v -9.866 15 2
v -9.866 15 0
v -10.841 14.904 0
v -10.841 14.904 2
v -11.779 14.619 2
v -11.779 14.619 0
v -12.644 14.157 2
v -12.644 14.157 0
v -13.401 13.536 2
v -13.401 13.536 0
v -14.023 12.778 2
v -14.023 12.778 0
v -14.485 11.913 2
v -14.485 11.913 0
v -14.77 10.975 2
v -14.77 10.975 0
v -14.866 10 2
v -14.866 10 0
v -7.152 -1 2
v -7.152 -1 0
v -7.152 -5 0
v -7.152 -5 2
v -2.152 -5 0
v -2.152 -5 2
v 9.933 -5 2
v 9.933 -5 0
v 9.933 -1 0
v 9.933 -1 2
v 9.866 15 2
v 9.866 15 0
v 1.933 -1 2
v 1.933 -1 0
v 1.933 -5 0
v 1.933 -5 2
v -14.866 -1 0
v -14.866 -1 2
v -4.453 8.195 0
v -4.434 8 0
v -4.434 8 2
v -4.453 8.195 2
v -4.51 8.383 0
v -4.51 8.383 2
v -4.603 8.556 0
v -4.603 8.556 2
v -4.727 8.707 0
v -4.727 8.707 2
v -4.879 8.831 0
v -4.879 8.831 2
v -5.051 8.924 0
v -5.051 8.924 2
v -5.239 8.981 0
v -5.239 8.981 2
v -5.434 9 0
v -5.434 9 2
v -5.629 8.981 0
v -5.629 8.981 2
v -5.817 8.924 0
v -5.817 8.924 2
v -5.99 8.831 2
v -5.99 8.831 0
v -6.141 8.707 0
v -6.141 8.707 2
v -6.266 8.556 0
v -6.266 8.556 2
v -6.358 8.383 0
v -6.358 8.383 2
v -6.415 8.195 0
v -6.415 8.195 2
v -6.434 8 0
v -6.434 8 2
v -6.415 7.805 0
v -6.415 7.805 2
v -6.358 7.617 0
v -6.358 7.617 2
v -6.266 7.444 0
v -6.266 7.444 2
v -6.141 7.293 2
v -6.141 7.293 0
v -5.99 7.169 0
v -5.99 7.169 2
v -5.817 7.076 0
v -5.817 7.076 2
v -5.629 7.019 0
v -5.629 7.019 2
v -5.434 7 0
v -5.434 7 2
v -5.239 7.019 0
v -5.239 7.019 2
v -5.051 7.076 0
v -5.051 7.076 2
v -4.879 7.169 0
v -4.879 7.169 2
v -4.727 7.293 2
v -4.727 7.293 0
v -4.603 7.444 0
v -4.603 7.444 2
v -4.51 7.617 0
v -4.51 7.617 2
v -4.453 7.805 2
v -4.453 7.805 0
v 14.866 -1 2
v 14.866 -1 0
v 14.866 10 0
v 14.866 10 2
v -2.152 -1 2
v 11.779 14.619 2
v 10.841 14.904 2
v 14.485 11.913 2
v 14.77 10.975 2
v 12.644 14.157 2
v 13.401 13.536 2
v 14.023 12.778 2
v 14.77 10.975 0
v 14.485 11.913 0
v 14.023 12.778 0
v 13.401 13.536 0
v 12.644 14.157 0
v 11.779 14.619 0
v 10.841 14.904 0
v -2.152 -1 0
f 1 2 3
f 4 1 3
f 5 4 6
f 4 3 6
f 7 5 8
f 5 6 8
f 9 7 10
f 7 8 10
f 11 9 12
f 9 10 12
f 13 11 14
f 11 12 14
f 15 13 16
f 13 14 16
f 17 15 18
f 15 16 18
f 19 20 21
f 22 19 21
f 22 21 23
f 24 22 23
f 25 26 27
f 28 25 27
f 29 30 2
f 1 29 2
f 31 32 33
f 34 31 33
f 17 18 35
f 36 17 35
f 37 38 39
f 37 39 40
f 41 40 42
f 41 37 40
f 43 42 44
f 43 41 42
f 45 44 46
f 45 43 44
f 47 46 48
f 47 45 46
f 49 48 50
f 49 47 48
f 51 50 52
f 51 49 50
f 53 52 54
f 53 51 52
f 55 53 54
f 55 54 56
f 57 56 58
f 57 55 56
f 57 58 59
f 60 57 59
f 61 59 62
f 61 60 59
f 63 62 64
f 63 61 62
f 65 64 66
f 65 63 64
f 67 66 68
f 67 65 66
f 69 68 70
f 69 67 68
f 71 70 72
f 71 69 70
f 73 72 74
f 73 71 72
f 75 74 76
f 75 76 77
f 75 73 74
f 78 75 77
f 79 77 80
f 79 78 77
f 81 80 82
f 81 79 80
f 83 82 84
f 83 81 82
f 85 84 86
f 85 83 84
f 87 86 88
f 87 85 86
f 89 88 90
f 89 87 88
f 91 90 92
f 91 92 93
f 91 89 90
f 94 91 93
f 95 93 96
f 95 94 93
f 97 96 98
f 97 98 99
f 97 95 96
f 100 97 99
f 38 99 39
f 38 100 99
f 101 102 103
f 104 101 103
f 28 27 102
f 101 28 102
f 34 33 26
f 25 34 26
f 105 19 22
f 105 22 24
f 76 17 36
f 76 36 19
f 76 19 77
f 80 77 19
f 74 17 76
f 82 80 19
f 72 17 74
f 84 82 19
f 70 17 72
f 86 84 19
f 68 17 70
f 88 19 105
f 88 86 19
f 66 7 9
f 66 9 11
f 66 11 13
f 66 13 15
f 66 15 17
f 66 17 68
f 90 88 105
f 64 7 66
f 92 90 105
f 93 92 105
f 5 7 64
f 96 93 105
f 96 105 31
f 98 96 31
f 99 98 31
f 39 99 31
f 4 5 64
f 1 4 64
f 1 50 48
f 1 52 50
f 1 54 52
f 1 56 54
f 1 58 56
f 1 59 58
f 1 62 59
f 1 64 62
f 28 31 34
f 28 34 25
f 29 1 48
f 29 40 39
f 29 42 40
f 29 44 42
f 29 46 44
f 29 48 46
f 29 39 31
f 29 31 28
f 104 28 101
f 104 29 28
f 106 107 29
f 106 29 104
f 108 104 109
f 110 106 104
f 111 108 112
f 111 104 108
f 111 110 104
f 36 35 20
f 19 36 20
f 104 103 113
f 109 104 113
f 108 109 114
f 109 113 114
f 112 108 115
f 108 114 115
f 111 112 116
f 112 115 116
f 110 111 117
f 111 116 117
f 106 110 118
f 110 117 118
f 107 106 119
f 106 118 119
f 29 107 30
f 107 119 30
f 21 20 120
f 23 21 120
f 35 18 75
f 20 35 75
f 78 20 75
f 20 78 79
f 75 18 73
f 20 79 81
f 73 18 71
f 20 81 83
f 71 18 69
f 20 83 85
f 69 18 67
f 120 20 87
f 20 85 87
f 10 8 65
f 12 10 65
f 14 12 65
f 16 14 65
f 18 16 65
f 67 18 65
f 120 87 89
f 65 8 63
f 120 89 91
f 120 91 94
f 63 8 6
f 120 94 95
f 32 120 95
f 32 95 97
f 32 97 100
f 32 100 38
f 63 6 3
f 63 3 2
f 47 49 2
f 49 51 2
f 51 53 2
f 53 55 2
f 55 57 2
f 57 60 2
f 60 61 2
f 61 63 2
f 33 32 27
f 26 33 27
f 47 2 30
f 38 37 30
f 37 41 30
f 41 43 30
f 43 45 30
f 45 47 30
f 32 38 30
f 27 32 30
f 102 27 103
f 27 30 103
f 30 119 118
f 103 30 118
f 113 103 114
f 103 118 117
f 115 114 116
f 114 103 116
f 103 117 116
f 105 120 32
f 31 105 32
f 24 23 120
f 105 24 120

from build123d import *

# Parameters (mm, degrees)
SKETCH1_R           = 1
BOSS_EXTRUDE1_DEPTH = 2


with BuildPart() as part:
    # Sketch1 → Boss-Extrude1 (new body)
    with BuildSketch(Plane.XY):
        with BuildLine():
            Line((9.9326669, -1), (14.865841105, -1))
            Line((14.865841105, -1), (14.865841105, 10))
            ThreePointArc((14.865841105, 10), (13.401375011, 13.535533906), (9.865841105, 15))
            Line((9.865841105, 15), (-9.865841105, 15))
            ThreePointArc((-9.865841105, 15), (-13.401375011, 13.535533906), (-14.865841105, 10))
            Line((-14.865841105, 10), (-14.865841105, -1))
            Line((-14.865841105, -1), (-7.151873985, -1))
            Line((-7.151873985, -1), (-7.151873985, -5))
            Line((-7.151873985, -5), (-2.151873985, -5))
            Line((-2.151873985, -5), (-2.151873985, -1))
            Line((-2.151873985, -1), (1.9326669, -1))
            Line((1.9326669, -1), (1.9326669, -5))
            Line((1.9326669, -5), (9.9326669, -5))
            Line((9.9326669, -5), (9.9326669, -1))
        make_face()
        with Locations((-5.434158895, 8)):
            Circle(SKETCH1_R, mode=Mode.SUBTRACT)
    extrude(amount=BOSS_EXTRUDE1_DEPTH)


solid = part.part
